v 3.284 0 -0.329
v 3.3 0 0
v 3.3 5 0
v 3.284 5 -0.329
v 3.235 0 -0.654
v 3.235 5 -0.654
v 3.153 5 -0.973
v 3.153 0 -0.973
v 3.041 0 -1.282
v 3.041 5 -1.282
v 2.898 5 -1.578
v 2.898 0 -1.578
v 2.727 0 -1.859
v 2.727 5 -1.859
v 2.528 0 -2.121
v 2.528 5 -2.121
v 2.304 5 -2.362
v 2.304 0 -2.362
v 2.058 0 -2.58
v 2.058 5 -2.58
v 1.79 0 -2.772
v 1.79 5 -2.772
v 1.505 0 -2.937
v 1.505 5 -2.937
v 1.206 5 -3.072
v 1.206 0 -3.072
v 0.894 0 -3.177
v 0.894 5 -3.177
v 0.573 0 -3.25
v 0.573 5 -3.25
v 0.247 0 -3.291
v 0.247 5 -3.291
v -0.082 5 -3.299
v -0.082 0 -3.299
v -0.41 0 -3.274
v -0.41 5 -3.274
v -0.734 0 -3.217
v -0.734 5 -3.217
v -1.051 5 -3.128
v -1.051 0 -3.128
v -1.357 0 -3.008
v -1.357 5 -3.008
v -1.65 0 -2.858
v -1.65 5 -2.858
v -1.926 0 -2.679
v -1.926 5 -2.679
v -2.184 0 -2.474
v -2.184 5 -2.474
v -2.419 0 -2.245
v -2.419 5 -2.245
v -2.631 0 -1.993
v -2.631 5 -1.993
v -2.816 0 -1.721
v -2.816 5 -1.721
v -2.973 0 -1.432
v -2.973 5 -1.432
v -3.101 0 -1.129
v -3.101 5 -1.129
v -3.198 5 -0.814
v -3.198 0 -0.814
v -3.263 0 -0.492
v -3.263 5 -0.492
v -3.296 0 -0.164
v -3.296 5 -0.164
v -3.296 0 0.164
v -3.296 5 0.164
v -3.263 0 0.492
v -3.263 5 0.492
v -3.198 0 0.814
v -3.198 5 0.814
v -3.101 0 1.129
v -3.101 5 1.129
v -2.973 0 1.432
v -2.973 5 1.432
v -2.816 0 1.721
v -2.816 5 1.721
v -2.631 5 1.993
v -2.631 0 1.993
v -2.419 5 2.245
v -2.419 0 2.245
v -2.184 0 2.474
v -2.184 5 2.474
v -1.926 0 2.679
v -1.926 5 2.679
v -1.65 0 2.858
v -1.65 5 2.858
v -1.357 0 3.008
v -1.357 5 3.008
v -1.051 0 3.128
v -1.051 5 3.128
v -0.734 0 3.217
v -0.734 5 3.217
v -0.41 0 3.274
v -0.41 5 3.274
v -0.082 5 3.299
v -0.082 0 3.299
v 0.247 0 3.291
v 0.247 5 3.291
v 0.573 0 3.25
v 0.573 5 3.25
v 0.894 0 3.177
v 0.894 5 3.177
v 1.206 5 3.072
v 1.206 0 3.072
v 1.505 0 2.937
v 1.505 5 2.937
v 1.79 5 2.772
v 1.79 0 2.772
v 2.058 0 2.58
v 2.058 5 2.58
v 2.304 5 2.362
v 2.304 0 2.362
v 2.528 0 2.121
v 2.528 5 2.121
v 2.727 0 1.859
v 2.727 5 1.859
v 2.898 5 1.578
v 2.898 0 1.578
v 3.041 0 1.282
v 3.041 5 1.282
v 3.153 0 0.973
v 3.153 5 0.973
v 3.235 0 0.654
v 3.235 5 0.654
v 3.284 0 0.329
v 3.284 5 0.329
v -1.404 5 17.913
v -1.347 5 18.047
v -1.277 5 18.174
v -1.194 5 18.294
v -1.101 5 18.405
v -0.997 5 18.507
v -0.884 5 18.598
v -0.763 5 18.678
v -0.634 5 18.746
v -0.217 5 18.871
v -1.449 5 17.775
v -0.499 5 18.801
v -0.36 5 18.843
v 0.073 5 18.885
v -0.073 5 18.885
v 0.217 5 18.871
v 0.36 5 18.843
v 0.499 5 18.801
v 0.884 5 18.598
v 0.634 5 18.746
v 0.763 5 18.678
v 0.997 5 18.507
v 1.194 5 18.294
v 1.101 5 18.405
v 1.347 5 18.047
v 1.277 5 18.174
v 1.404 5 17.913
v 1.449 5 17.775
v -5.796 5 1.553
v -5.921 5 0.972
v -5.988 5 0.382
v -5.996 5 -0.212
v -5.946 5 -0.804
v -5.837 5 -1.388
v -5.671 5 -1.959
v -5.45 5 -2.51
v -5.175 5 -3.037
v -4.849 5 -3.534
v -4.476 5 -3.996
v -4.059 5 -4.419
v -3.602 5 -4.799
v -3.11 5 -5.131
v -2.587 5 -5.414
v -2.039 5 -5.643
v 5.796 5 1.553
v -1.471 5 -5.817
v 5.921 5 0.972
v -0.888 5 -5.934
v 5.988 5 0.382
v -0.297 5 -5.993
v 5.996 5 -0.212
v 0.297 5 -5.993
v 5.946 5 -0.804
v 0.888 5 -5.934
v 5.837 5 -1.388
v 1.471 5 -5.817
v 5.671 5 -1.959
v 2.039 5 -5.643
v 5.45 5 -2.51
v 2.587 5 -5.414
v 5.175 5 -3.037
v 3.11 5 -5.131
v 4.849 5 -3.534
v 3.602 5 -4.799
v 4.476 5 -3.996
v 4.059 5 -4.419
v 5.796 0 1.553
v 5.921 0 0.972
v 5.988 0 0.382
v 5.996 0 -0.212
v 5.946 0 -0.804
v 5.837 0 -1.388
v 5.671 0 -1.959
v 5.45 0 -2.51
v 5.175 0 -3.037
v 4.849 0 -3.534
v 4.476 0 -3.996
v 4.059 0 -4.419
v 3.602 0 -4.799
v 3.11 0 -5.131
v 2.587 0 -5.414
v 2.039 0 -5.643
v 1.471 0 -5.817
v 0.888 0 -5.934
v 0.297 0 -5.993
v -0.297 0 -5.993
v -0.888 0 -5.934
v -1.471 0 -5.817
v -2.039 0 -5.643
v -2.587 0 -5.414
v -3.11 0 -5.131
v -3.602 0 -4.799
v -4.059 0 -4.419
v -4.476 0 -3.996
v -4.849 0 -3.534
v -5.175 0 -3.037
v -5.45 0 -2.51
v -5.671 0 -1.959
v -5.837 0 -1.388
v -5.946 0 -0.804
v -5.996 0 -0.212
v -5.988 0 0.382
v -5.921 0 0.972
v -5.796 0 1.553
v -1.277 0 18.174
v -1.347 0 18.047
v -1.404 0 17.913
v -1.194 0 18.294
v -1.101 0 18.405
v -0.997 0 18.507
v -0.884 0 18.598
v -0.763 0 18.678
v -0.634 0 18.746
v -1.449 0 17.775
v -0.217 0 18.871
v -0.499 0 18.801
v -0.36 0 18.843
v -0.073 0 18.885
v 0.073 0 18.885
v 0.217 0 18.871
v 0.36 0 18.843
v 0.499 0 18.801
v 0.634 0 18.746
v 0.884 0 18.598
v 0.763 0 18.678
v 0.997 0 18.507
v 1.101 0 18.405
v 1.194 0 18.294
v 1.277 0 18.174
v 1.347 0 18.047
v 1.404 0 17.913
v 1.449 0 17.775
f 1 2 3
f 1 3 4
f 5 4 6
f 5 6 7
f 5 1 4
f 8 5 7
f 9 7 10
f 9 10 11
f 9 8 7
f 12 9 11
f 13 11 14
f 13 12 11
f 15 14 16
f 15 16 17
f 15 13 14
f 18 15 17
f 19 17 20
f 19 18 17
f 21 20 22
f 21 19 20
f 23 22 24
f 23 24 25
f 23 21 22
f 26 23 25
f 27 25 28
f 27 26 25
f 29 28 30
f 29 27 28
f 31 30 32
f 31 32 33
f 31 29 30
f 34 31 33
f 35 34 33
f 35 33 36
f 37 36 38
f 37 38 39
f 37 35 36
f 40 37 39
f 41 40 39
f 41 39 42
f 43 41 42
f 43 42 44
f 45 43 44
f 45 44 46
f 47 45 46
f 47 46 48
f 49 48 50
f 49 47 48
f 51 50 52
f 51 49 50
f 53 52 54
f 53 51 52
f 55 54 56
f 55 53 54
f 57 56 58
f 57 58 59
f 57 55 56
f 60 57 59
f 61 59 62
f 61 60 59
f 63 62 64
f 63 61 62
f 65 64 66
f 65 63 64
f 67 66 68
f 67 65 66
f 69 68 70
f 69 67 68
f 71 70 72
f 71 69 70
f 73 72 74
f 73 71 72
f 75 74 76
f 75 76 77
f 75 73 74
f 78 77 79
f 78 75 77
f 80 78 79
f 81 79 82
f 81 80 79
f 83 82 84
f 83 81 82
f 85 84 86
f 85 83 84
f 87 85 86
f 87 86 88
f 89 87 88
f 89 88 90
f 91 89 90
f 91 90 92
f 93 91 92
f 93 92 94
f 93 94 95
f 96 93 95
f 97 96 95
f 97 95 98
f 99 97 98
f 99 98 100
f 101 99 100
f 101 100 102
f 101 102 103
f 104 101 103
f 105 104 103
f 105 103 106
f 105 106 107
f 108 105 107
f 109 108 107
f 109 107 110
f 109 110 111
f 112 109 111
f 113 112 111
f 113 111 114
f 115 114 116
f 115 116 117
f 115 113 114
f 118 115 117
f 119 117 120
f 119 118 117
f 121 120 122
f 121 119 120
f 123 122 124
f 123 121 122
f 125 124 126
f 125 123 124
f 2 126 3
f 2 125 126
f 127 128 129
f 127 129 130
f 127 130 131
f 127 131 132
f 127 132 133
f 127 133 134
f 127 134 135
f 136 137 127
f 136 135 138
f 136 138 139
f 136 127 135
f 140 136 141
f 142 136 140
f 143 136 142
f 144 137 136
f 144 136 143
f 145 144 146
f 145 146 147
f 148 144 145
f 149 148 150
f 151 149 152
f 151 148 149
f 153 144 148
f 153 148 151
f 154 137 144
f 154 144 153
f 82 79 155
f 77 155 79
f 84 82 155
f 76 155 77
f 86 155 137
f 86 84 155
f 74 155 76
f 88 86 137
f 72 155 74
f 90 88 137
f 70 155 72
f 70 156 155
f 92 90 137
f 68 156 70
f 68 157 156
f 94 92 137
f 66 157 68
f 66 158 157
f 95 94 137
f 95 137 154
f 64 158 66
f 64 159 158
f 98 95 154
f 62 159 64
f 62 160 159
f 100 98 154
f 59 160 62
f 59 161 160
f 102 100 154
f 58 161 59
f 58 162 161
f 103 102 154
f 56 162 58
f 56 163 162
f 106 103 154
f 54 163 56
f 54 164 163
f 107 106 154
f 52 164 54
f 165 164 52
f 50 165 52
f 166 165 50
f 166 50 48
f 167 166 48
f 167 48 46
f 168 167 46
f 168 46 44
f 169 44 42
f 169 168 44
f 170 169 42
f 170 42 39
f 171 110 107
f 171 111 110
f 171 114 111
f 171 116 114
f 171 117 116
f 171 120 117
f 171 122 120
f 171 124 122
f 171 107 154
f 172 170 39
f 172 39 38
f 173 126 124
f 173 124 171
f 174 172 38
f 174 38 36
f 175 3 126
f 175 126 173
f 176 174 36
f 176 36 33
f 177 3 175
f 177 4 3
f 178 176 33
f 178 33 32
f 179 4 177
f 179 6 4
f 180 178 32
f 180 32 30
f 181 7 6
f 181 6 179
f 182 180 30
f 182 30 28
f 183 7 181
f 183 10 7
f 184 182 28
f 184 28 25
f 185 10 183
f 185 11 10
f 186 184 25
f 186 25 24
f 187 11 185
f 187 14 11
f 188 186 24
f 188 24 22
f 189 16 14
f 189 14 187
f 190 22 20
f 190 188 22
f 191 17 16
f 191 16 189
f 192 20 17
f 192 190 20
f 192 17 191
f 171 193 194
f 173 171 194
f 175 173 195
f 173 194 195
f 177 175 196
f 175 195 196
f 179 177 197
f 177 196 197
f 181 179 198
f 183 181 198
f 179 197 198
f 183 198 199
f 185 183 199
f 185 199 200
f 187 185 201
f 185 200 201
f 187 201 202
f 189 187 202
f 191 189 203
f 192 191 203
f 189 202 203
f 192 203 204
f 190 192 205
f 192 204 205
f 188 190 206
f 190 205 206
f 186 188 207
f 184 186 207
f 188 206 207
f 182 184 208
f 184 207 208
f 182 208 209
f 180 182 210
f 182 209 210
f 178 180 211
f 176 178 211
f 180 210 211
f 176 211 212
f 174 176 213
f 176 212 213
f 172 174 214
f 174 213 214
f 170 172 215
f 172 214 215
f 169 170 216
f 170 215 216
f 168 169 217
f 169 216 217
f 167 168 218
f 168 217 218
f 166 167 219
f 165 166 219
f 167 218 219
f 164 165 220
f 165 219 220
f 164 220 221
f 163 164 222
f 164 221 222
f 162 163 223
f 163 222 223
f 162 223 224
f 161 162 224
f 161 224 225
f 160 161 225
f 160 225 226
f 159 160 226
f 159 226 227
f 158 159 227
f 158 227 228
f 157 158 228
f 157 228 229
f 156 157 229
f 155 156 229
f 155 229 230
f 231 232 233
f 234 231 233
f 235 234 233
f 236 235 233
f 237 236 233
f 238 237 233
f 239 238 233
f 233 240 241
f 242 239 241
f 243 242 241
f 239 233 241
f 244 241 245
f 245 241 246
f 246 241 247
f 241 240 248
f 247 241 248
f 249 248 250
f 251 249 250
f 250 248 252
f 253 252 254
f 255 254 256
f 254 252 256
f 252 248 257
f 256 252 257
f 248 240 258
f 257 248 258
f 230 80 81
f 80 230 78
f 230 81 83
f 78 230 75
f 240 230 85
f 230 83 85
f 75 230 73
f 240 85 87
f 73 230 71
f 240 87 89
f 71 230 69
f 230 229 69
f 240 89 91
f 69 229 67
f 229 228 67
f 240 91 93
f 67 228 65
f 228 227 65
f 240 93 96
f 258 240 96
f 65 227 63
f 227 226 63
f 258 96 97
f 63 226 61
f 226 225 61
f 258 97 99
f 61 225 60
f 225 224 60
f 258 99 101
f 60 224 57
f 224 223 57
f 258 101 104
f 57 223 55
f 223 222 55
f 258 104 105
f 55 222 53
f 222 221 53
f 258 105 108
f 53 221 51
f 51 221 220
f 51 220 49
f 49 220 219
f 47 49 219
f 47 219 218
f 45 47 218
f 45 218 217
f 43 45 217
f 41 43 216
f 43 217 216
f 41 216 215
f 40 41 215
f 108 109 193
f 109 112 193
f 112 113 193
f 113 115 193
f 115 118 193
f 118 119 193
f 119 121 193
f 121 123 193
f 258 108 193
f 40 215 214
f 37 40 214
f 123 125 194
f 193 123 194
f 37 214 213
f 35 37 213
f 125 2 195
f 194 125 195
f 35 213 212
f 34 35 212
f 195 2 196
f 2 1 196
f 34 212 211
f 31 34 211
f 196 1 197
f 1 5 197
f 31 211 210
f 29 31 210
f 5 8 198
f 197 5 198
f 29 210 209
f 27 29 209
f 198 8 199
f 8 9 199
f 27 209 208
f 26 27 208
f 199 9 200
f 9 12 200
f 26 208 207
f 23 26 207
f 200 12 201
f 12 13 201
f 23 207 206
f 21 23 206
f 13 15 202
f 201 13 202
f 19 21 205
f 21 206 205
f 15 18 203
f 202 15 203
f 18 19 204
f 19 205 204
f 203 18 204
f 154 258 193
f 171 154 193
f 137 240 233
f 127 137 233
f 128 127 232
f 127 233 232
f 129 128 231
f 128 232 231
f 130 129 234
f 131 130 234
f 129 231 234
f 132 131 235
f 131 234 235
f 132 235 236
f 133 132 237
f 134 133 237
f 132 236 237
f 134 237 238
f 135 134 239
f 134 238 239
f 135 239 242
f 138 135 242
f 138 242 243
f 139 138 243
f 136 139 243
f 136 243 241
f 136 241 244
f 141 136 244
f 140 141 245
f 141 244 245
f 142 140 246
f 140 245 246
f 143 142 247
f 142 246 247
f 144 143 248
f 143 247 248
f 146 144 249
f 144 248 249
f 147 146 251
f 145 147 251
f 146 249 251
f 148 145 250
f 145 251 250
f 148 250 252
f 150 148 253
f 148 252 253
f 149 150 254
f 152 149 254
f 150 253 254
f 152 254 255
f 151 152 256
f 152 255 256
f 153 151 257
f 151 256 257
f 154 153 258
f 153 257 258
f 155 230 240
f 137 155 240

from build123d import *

# Parameters (mm, degrees)
SKETCH_1_R      = 6
SKETCH_1_R_2    = 3.3
EXTRUDE_1_DEPTH = 5


with BuildPart() as part:
    # 스케치1 → 보스-돌출1 (new body)
    with BuildSketch(Plane(origin=(0, 0, 0), x_dir=(1, 0, 0), z_dir=(0, 1, 0))):
        Circle(SKETCH_1_R)
        Circle(SKETCH_1_R_2, mode=Mode.SUBTRACT)
        with BuildLine():
            Line((-5.795554958, -1.552914271), (-1.448888739, -17.774893441))
            ThreePointArc((-1.448888739, -17.774893441), (0, -18.886664873), (1.448888739, -17.774893441))
            Line((1.448888739, -17.774893441), (5.795554958, -1.552914271))
            ThreePointArc((5.795554958, -1.552914271), (0, -6), (-5.795554958, -1.552914271))
        make_face()
    extrude(amount=EXTRUDE_1_DEPTH)


solid = part.part
